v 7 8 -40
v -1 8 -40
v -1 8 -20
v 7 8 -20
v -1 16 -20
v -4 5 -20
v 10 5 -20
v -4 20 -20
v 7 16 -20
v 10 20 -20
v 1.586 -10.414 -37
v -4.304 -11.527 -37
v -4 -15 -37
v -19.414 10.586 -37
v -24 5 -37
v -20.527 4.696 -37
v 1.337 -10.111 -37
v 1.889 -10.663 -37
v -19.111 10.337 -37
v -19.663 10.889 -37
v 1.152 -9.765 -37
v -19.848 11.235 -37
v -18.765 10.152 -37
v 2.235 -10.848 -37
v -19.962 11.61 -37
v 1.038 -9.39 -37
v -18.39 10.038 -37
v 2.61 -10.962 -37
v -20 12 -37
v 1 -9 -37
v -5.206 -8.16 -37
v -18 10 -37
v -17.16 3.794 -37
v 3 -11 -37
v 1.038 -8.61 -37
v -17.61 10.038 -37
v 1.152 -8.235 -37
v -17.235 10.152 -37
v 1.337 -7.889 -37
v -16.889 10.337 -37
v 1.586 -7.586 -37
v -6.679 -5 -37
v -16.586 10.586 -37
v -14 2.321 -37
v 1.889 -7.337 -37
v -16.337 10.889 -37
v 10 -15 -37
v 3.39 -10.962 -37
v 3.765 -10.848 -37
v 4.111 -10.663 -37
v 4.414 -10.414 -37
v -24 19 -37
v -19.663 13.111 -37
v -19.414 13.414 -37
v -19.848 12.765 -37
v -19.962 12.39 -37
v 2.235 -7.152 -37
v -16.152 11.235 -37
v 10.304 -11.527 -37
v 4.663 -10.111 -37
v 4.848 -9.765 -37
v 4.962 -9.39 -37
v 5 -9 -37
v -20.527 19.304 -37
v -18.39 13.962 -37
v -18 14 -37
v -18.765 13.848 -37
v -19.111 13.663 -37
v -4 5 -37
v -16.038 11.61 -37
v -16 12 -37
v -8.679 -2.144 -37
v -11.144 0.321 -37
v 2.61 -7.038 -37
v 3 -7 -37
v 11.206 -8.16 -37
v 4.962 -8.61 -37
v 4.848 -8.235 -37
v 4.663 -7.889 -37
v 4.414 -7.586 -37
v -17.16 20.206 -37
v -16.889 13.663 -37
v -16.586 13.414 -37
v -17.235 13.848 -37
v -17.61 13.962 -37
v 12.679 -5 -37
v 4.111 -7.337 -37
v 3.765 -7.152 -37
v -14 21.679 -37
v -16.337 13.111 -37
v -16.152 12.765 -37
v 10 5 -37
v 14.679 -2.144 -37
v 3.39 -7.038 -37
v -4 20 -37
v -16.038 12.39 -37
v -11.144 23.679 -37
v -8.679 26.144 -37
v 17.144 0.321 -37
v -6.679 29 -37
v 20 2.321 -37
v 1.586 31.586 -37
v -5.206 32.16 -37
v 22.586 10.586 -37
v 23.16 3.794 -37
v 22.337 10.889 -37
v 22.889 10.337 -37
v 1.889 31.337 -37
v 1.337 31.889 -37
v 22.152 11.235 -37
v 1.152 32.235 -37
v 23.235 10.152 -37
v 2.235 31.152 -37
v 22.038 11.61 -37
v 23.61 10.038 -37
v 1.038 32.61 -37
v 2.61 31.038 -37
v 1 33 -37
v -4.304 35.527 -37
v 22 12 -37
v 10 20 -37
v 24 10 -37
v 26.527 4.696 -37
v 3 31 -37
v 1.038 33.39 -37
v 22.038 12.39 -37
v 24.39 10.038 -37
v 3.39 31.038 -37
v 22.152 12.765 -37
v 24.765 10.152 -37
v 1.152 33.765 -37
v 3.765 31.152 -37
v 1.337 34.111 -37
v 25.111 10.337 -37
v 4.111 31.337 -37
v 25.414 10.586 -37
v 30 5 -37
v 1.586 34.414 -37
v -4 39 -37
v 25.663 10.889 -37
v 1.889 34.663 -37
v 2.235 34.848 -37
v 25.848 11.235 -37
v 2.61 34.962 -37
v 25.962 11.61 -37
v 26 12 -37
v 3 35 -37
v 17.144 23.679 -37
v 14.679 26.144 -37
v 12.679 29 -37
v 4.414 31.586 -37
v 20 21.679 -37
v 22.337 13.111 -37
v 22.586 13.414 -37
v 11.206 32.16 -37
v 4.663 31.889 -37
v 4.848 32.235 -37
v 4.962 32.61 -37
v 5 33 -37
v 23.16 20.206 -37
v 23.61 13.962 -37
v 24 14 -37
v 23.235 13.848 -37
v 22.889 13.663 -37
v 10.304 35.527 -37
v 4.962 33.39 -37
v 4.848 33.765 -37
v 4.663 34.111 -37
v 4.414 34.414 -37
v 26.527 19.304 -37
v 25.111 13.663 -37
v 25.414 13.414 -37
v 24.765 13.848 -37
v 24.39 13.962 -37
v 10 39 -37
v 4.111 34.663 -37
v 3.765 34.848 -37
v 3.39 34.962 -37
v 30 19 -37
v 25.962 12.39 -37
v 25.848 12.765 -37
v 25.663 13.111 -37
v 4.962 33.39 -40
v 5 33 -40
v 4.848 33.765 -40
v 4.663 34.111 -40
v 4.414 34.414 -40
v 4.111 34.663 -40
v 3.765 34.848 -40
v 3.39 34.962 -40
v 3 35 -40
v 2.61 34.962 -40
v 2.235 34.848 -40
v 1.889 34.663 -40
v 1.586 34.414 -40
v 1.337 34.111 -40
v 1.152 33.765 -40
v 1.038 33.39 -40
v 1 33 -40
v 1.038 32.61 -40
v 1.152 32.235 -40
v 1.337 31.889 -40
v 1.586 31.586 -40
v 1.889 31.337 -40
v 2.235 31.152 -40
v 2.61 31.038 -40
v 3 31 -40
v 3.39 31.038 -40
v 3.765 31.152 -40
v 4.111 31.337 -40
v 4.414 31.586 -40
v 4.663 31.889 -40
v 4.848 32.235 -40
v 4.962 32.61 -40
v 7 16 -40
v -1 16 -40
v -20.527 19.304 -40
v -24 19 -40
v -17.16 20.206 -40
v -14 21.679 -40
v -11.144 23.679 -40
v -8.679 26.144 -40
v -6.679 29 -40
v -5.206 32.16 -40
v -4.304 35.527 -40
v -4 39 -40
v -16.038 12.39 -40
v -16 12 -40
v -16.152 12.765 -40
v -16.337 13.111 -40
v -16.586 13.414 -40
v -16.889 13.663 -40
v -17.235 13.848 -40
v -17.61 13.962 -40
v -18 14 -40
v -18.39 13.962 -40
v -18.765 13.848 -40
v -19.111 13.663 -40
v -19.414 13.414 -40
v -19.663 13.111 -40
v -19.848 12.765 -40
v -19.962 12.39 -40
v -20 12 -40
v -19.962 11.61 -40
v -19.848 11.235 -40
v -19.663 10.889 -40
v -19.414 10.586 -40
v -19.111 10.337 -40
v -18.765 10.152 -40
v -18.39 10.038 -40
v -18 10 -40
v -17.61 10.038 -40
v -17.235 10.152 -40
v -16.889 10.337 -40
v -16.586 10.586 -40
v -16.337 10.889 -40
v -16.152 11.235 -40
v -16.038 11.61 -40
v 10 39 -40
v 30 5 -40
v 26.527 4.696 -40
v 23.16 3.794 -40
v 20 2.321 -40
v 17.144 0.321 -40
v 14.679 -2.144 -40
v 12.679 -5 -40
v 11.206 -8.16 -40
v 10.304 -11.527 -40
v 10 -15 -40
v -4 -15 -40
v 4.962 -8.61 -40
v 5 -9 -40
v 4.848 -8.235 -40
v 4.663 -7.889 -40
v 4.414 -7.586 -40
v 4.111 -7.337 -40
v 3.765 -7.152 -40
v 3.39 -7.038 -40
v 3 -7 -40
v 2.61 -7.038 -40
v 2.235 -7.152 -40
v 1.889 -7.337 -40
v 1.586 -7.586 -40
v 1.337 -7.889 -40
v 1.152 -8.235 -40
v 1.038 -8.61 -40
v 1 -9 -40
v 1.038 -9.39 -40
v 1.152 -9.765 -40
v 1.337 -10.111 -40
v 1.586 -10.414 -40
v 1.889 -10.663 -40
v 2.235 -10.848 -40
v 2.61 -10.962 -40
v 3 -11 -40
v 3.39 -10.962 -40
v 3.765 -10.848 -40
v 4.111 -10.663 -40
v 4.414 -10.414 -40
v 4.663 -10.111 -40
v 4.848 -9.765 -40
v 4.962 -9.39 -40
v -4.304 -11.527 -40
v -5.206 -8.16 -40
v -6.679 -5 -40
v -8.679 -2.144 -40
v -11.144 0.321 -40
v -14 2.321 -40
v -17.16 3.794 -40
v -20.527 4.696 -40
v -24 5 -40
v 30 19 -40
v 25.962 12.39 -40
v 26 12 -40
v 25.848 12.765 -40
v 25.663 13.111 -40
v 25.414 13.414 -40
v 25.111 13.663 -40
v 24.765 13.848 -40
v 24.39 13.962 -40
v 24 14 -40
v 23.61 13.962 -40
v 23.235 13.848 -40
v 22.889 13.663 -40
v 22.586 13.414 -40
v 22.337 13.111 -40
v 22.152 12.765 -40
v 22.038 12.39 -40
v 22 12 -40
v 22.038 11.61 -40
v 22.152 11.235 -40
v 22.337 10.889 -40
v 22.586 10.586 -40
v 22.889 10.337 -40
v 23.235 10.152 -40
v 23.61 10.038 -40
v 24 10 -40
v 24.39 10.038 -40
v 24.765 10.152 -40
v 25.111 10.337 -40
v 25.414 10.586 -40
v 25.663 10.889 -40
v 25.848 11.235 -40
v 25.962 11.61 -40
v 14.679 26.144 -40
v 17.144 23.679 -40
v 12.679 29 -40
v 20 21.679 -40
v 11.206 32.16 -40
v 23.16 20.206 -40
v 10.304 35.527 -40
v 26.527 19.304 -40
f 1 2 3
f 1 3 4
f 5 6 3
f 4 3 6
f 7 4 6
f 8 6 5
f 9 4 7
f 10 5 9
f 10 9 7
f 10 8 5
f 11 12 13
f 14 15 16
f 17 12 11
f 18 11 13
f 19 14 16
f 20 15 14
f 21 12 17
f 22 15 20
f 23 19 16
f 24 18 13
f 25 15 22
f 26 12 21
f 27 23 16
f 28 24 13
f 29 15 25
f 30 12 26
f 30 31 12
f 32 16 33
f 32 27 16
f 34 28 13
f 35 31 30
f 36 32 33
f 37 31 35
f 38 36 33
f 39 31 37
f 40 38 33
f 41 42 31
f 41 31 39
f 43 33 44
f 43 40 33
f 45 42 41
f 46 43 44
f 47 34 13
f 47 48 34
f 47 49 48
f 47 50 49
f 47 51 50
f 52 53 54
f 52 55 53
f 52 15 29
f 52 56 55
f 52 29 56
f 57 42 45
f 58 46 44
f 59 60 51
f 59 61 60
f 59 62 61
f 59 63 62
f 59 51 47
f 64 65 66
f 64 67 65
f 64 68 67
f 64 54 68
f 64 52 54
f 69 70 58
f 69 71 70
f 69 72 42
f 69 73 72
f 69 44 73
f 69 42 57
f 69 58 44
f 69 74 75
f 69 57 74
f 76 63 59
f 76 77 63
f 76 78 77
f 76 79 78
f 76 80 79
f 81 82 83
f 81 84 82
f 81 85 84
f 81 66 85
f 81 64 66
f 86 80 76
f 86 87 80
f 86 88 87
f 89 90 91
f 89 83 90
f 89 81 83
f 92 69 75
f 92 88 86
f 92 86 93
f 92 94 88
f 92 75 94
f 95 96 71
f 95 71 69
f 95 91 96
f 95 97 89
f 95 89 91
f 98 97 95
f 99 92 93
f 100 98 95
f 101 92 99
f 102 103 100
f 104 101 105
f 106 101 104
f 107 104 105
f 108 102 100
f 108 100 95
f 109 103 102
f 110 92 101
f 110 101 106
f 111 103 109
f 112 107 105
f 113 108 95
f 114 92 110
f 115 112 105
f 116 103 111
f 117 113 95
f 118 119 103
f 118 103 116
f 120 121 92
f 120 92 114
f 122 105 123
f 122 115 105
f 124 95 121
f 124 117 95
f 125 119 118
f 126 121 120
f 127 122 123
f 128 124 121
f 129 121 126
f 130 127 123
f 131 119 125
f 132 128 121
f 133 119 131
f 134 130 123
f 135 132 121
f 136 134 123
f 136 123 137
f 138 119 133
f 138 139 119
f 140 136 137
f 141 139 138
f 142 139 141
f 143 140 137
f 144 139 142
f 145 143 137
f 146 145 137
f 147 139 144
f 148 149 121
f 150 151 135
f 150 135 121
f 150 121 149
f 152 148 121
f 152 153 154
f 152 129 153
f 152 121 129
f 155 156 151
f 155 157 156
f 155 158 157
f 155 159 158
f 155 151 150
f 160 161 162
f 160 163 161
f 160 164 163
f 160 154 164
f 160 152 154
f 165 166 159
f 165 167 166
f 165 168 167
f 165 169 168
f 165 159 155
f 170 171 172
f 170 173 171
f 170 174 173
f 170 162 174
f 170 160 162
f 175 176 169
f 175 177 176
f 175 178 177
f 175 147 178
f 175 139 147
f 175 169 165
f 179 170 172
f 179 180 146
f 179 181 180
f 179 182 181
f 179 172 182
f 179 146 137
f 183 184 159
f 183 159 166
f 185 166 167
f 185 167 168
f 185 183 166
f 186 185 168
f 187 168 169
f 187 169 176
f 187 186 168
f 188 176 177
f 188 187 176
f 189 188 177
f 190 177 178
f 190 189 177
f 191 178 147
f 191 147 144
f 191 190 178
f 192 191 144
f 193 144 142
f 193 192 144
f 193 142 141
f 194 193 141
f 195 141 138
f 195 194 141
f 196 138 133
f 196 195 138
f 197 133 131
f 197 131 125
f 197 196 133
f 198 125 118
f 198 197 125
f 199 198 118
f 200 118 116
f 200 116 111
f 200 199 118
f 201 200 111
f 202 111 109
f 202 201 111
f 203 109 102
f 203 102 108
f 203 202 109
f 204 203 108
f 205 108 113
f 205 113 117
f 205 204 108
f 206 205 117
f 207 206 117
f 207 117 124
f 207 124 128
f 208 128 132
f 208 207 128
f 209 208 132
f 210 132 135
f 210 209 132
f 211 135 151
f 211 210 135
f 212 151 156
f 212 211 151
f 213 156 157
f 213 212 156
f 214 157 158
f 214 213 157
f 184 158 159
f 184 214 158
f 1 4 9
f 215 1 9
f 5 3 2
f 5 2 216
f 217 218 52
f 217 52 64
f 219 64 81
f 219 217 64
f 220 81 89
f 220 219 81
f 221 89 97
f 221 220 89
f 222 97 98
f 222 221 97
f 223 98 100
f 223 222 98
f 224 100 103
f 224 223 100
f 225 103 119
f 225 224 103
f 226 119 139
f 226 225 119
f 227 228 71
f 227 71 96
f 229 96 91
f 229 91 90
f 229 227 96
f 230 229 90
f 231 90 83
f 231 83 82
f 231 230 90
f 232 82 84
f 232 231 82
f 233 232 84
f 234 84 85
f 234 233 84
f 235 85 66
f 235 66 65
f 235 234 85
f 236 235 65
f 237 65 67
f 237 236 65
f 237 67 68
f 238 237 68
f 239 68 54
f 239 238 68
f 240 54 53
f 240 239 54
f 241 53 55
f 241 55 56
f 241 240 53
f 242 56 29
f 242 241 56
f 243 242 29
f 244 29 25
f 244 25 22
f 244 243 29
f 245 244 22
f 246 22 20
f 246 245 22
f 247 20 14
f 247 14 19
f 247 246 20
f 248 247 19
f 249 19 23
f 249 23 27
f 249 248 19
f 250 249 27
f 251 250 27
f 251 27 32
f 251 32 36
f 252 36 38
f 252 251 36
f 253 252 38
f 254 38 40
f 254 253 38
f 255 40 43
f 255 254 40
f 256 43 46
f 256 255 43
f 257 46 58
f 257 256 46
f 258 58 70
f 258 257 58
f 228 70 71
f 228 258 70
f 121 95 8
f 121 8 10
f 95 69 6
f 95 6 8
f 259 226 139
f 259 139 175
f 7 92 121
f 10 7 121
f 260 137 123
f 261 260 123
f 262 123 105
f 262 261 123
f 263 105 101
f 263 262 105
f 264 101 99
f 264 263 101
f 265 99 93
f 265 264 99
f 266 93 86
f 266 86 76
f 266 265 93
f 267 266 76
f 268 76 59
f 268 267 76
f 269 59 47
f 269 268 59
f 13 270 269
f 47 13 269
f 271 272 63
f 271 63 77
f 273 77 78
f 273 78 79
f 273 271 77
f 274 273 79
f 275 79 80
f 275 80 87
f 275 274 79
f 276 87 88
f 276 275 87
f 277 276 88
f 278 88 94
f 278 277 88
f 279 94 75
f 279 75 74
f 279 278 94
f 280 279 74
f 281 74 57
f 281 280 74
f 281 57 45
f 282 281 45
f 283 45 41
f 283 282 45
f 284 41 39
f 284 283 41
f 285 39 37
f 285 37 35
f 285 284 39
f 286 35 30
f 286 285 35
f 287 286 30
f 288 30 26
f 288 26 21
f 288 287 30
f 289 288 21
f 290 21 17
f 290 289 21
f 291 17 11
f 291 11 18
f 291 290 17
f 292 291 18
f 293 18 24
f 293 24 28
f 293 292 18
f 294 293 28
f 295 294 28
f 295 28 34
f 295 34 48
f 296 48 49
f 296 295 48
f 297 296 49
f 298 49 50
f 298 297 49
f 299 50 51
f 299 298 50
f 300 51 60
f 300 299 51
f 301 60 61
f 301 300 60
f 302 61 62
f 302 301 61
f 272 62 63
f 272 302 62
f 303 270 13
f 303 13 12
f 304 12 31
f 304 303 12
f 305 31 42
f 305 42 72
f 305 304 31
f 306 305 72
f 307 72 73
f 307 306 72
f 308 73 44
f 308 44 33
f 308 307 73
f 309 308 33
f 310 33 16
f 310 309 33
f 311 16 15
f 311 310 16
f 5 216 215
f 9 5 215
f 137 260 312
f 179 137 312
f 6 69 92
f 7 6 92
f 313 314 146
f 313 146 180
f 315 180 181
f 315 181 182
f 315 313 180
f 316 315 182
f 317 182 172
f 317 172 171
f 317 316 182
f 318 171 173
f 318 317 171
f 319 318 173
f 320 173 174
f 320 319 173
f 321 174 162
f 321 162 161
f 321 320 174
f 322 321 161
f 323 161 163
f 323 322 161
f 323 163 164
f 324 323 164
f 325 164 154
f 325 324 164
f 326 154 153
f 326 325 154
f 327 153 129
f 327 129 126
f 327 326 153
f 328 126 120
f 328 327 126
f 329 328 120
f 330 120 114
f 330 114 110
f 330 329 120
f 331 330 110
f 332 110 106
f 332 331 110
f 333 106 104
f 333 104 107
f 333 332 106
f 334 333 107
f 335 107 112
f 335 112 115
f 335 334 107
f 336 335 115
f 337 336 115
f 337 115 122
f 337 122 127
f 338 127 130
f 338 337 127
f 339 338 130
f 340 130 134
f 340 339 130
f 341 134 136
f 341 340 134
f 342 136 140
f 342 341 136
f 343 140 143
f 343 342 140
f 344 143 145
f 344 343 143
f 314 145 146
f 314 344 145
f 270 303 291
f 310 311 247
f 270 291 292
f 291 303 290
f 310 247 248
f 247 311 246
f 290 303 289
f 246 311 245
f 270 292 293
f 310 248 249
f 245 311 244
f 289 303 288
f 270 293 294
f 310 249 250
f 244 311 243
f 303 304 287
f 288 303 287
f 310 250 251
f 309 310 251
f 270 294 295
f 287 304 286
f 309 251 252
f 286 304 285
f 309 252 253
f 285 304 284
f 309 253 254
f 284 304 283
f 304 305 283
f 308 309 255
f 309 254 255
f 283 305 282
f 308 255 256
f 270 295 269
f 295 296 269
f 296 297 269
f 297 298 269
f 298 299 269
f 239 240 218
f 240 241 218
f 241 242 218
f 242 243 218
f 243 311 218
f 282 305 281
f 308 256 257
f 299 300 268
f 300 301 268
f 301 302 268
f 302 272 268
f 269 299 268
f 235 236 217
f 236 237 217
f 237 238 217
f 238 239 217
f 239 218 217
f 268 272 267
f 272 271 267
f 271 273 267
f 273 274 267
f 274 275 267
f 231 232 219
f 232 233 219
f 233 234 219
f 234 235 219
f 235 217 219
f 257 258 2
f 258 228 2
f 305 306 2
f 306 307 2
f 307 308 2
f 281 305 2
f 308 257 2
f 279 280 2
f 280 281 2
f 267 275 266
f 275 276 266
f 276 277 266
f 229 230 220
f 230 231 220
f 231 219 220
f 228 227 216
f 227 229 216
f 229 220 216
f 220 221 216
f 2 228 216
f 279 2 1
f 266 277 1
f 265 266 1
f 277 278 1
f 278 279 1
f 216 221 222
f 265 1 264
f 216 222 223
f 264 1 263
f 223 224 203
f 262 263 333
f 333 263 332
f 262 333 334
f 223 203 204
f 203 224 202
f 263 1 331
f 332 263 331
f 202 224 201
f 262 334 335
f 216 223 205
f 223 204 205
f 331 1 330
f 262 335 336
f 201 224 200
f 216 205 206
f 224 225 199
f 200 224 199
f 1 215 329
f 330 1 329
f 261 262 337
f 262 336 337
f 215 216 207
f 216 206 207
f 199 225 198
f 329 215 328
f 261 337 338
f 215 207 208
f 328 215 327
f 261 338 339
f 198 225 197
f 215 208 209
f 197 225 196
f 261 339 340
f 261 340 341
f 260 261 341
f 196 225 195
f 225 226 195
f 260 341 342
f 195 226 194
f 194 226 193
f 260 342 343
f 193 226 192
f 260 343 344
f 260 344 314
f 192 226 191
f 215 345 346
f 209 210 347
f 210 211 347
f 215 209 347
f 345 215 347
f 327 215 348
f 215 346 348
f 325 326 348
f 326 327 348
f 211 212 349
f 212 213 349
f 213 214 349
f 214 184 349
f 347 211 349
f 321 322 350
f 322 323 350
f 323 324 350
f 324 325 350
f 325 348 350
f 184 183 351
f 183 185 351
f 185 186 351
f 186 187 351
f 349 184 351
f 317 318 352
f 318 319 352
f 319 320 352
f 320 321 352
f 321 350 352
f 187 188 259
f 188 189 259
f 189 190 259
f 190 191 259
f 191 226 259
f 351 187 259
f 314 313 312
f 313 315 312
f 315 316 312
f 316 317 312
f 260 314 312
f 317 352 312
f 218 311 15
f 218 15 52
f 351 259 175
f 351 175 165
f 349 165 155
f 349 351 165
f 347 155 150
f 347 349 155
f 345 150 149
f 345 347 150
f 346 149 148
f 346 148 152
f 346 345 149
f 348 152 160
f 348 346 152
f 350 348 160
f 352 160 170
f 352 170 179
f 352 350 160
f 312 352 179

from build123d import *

# Parameters (mm, degrees)
CYLINDER018_R     = 2
CYLINDER018_DEPTH = 3
CYLINDER019_R     = 2
CYLINDER019_DEPTH = 3
CYLINDER014_R     = 20
CYLINDER014_DEPTH = 3
CYLINDER021_R     = 2
CYLINDER021_DEPTH = 3
CYLINDER017_R     = 20
CYLINDER017_DEPTH = 3
CYLINDER016_R     = 20
CYLINDER016_DEPTH = 3
CYLINDER015_R     = 20
CYLINDER015_DEPTH = 3
CYLINDER020_R     = 2
CYLINDER020_DEPTH = 3
BOX016_W          = 8
BOX016_H          = 8
BOX016_DEPTH      = 20
BOX018_W          = 54
BOX018_H          = 54
BOX018_DEPTH      = 3
BOX015_W          = 14
BOX015_H          = 15
BOX015_DEPTH      = 20


with BuildPart() as zylinder018:
    # Cylinder018 → Cylinder018 (new body)
    with BuildSketch(Plane(origin=(3, -9, -40), x_dir=(1, 0, 0), z_dir=(0, 0, 1))):
        Circle(CYLINDER018_R)
    extrude(amount=CYLINDER018_DEPTH)


with BuildPart() as zylinder019:
    # Cylinder019 → Cylinder019 (new body)
    with BuildSketch(Plane(origin=(3, 33, -40), x_dir=(1, 0, 0), z_dir=(0, 0, 1))):
        Circle(CYLINDER019_R)
    extrude(amount=CYLINDER019_DEPTH)


with BuildPart() as zylinder014:
    # Cylinder014 → Cylinder014 (new body)
    with BuildSketch(Plane(origin=(30, -15, -40), x_dir=(1, 0, 0), z_dir=(0, 0, 1))):
        Circle(CYLINDER014_R)
    extrude(amount=CYLINDER014_DEPTH)


with BuildPart() as zylinder021:
    # Cylinder021 → Cylinder021 (new body)
    with BuildSketch(Plane(origin=(-18, 12, -40), x_dir=(1, 0, 0), z_dir=(0, 0, 1))):
        Circle(CYLINDER021_R)
    extrude(amount=CYLINDER021_DEPTH)


with BuildPart() as zylinder017:
    # Cylinder017 → Cylinder017 (new body)
    with BuildSketch(Plane(origin=(30, 39, -40), x_dir=(1, 0, 0), z_dir=(0, 0, 1))):
        Circle(CYLINDER017_R)
    extrude(amount=CYLINDER017_DEPTH)


with BuildPart() as zylinder016:
    # Cylinder016 → Cylinder016 (new body)
    with BuildSketch(Plane(origin=(-24, 39, -40), x_dir=(1, 0, 0), z_dir=(0, 0, 1))):
        Circle(CYLINDER016_R)
    extrude(amount=CYLINDER016_DEPTH)


with BuildPart() as zylinder015:
    # Cylinder015 → Cylinder015 (new body)
    with BuildSketch(Plane(origin=(-24, -15, -40), x_dir=(1, 0, 0), z_dir=(0, 0, 1))):
        Circle(CYLINDER015_R)
    extrude(amount=CYLINDER015_DEPTH)


with BuildPart() as zylinder020:
    # Cylinder020 → Cylinder020 (new body)
    with BuildSketch(Plane(origin=(24, 12, -40), x_dir=(1, 0, 0), z_dir=(0, 0, 1))):
        Circle(CYLINDER020_R)
    extrude(amount=CYLINDER020_DEPTH)


with BuildPart() as fusion009:
    # Box016 → Box016 (new body)
    with BuildSketch(Plane(origin=(-1, 8, -40), x_dir=(1, 0, 0), z_dir=(0, 0, 1))):
        with Locations((4, 4)):
            Rectangle(BOX016_W, BOX016_H)
    extrude(amount=BOX016_DEPTH)

    # Fusion009: union Zylinder018, Zylinder019, Zylinder014, Zylinder021, Zylinder017, Zylinder016, Zylinder015, Zylinder020
    add(zylinder018.part)
    add(zylinder019.part)
    add(zylinder014.part)
    add(zylinder021.part)
    add(zylinder017.part)
    add(zylinder016.part)
    add(zylinder015.part)
    add(zylinder020.part)


with BuildPart() as cube018:
    # Box018 → Box018 (new body)
    with BuildSketch(Plane(origin=(-24, -15, -40), x_dir=(1, 0, 0), z_dir=(0, 0, 1))):
        with Locations((27, 27)):
            Rectangle(BOX018_W, BOX018_H)
    extrude(amount=BOX018_DEPTH)


with BuildPart() as sockel:
    # Box015 → Box015 (new body)
    with BuildSketch(Plane(origin=(-4, 5, -40), x_dir=(1, 0, 0), z_dir=(0, 0, 1))):
        with Locations((7, 7.5)):
            Rectangle(BOX015_W, BOX015_H)
    extrude(amount=BOX015_DEPTH)

    # Fusion008: union Cube018
    add(cube018.part)

    # Cut004: cut Fusion009
    add(fusion009.part, mode=Mode.SUBTRACT)


solid = sockel.part
